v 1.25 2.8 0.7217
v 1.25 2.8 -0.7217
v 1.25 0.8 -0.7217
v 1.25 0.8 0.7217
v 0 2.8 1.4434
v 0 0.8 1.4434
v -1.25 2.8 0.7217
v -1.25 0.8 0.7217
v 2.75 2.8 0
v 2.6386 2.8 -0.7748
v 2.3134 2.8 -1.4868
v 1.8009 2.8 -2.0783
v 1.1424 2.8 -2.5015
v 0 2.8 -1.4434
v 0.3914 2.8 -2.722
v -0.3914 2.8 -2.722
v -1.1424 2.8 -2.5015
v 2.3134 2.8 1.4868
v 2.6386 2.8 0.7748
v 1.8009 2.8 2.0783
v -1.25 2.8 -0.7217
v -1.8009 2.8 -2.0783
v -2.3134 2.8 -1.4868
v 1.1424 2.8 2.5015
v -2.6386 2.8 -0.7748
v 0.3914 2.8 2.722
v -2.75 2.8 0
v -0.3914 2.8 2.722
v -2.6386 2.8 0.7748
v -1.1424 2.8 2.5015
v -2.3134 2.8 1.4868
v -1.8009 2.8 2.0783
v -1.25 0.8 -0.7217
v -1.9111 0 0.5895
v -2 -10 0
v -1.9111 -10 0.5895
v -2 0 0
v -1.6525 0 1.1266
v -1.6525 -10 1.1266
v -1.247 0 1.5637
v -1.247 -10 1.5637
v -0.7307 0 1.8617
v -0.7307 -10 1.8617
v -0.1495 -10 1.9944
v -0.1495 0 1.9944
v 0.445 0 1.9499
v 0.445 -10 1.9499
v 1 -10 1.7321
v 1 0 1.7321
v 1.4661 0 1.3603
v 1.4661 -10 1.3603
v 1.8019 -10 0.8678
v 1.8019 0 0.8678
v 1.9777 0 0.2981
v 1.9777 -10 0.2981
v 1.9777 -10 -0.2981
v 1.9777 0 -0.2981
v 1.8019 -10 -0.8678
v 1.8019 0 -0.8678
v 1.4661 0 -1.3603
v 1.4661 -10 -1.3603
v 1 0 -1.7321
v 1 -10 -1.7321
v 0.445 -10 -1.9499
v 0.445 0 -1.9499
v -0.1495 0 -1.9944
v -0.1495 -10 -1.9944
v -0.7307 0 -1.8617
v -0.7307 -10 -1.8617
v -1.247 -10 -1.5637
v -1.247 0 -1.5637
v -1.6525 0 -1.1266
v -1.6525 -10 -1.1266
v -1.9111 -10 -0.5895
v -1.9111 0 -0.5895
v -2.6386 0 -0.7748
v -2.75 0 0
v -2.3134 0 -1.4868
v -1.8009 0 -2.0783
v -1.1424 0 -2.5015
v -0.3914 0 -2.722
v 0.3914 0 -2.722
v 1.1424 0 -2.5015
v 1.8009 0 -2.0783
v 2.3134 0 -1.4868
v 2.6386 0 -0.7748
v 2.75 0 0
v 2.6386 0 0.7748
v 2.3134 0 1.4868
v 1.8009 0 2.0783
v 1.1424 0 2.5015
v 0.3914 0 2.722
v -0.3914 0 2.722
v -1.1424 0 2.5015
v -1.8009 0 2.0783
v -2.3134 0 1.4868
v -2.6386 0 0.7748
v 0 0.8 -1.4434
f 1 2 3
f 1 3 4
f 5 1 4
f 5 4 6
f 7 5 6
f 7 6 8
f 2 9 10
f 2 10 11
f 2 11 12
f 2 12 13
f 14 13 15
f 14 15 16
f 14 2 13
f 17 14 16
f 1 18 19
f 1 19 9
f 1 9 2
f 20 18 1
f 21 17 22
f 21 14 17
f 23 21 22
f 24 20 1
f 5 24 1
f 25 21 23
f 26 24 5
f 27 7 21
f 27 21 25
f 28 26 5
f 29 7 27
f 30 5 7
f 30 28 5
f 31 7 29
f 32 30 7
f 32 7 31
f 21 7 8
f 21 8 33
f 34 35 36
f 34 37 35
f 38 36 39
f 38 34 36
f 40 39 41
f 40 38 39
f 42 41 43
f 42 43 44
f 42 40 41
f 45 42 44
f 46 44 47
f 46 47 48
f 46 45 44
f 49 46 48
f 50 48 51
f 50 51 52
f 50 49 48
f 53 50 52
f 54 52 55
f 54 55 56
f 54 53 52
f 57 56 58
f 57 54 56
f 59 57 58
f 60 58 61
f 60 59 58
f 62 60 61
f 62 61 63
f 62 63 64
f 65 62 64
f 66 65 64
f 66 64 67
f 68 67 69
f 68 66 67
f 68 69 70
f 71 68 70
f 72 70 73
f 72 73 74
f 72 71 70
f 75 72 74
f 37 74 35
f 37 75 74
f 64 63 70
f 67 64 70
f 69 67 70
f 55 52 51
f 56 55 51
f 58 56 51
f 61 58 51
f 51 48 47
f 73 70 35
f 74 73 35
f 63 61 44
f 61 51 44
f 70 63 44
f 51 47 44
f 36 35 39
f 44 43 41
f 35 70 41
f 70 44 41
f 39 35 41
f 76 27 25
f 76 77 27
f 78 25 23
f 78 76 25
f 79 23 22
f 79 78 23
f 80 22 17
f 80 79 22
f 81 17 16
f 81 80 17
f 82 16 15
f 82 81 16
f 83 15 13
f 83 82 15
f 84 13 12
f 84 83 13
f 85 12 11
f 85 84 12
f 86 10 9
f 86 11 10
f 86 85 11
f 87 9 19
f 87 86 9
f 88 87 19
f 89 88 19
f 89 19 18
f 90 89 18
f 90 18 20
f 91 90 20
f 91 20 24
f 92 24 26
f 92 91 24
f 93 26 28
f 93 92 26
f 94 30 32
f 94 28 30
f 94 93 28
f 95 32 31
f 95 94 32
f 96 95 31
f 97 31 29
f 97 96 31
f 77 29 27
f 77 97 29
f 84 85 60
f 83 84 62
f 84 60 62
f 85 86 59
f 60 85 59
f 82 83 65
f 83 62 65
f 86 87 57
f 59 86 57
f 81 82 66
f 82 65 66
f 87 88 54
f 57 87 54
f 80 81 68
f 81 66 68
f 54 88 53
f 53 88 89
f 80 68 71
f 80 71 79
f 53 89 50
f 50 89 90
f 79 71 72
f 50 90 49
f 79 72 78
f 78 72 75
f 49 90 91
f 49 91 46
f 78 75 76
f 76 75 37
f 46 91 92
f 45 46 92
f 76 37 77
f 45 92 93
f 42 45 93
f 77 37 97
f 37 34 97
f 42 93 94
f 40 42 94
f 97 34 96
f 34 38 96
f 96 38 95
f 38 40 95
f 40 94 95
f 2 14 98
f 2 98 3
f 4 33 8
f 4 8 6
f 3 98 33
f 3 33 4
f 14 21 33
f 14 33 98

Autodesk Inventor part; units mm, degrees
ref_plane "YZ Plane" through (0, 0, 0) normal (1, 0, 0) x (0, 1, 0)
ref_plane "XZ Plane" through (0, 0, 0) normal (0, 1, 0) x (-1, 0, 0)
ref_plane "XY Plane" through (0, 0, 0) normal (0, 0, 1) x (1, 0, 0)
sketch "Sketch1" plane through (0, 0, 0) normal (0, 1, 0) x (-1, 0, 0)
  circle A0 centre (0, 0) radius 2.75
  circle A1 centre (0, 0) radius 2
  dimension "d0" = 5.5
  dimension "d1" = 4
extrude "Extrusion1" add sketch "Sketch1" against normal blind 10 contours A1
extrude "Extrusion2" add sketch "Sketch1" along normal blind 2.8 contours A0 | A1
sketch "Sketch2" plane through (0, 2.8, 0) normal (0, 1, 0) x (1, 0, 0)
  circle A0 centre (0, 0) radius 2 projected
  line L0 (-1.25, -0.7217) -> (-1.25, 0.7217)
  line L1 (-1.25, 0.7217) -> (0, 1.4434)
  line L2 (0, 1.4434) -> (1.25, 0.7217)
  line L3 (1.25, 0.7217) -> (1.25, -0.7217)
  line L4 (1.25, -0.7217) -> (0, -1.4434)
  line L5 (0, -1.4434) -> (-1.25, -0.7217)
  dimension "d6" = 2.5
extrude "Extrusion3" cut sketch "Sketch2" against normal blind 2 contours L0 L1 L2 L3 L4 L5
equation "\"d0\" = D_"
equation "\"d1\" = M_"
equation "\"d2\" = L_"
equation "\"d4\" = K_"
equation "\"d6\" = S_"
equation "\"d7\" = t_"
equation "\"K_\" = 2.8"
equation "\"D_\" = 5.5"
equation "\"S_\" = 2.5"
equation "\"t_\" = 2"
equation "\"M_\" = 4"
equation "\"L_\" = 10"
properties part number "M4 x 10" material "Stainless Steel"
